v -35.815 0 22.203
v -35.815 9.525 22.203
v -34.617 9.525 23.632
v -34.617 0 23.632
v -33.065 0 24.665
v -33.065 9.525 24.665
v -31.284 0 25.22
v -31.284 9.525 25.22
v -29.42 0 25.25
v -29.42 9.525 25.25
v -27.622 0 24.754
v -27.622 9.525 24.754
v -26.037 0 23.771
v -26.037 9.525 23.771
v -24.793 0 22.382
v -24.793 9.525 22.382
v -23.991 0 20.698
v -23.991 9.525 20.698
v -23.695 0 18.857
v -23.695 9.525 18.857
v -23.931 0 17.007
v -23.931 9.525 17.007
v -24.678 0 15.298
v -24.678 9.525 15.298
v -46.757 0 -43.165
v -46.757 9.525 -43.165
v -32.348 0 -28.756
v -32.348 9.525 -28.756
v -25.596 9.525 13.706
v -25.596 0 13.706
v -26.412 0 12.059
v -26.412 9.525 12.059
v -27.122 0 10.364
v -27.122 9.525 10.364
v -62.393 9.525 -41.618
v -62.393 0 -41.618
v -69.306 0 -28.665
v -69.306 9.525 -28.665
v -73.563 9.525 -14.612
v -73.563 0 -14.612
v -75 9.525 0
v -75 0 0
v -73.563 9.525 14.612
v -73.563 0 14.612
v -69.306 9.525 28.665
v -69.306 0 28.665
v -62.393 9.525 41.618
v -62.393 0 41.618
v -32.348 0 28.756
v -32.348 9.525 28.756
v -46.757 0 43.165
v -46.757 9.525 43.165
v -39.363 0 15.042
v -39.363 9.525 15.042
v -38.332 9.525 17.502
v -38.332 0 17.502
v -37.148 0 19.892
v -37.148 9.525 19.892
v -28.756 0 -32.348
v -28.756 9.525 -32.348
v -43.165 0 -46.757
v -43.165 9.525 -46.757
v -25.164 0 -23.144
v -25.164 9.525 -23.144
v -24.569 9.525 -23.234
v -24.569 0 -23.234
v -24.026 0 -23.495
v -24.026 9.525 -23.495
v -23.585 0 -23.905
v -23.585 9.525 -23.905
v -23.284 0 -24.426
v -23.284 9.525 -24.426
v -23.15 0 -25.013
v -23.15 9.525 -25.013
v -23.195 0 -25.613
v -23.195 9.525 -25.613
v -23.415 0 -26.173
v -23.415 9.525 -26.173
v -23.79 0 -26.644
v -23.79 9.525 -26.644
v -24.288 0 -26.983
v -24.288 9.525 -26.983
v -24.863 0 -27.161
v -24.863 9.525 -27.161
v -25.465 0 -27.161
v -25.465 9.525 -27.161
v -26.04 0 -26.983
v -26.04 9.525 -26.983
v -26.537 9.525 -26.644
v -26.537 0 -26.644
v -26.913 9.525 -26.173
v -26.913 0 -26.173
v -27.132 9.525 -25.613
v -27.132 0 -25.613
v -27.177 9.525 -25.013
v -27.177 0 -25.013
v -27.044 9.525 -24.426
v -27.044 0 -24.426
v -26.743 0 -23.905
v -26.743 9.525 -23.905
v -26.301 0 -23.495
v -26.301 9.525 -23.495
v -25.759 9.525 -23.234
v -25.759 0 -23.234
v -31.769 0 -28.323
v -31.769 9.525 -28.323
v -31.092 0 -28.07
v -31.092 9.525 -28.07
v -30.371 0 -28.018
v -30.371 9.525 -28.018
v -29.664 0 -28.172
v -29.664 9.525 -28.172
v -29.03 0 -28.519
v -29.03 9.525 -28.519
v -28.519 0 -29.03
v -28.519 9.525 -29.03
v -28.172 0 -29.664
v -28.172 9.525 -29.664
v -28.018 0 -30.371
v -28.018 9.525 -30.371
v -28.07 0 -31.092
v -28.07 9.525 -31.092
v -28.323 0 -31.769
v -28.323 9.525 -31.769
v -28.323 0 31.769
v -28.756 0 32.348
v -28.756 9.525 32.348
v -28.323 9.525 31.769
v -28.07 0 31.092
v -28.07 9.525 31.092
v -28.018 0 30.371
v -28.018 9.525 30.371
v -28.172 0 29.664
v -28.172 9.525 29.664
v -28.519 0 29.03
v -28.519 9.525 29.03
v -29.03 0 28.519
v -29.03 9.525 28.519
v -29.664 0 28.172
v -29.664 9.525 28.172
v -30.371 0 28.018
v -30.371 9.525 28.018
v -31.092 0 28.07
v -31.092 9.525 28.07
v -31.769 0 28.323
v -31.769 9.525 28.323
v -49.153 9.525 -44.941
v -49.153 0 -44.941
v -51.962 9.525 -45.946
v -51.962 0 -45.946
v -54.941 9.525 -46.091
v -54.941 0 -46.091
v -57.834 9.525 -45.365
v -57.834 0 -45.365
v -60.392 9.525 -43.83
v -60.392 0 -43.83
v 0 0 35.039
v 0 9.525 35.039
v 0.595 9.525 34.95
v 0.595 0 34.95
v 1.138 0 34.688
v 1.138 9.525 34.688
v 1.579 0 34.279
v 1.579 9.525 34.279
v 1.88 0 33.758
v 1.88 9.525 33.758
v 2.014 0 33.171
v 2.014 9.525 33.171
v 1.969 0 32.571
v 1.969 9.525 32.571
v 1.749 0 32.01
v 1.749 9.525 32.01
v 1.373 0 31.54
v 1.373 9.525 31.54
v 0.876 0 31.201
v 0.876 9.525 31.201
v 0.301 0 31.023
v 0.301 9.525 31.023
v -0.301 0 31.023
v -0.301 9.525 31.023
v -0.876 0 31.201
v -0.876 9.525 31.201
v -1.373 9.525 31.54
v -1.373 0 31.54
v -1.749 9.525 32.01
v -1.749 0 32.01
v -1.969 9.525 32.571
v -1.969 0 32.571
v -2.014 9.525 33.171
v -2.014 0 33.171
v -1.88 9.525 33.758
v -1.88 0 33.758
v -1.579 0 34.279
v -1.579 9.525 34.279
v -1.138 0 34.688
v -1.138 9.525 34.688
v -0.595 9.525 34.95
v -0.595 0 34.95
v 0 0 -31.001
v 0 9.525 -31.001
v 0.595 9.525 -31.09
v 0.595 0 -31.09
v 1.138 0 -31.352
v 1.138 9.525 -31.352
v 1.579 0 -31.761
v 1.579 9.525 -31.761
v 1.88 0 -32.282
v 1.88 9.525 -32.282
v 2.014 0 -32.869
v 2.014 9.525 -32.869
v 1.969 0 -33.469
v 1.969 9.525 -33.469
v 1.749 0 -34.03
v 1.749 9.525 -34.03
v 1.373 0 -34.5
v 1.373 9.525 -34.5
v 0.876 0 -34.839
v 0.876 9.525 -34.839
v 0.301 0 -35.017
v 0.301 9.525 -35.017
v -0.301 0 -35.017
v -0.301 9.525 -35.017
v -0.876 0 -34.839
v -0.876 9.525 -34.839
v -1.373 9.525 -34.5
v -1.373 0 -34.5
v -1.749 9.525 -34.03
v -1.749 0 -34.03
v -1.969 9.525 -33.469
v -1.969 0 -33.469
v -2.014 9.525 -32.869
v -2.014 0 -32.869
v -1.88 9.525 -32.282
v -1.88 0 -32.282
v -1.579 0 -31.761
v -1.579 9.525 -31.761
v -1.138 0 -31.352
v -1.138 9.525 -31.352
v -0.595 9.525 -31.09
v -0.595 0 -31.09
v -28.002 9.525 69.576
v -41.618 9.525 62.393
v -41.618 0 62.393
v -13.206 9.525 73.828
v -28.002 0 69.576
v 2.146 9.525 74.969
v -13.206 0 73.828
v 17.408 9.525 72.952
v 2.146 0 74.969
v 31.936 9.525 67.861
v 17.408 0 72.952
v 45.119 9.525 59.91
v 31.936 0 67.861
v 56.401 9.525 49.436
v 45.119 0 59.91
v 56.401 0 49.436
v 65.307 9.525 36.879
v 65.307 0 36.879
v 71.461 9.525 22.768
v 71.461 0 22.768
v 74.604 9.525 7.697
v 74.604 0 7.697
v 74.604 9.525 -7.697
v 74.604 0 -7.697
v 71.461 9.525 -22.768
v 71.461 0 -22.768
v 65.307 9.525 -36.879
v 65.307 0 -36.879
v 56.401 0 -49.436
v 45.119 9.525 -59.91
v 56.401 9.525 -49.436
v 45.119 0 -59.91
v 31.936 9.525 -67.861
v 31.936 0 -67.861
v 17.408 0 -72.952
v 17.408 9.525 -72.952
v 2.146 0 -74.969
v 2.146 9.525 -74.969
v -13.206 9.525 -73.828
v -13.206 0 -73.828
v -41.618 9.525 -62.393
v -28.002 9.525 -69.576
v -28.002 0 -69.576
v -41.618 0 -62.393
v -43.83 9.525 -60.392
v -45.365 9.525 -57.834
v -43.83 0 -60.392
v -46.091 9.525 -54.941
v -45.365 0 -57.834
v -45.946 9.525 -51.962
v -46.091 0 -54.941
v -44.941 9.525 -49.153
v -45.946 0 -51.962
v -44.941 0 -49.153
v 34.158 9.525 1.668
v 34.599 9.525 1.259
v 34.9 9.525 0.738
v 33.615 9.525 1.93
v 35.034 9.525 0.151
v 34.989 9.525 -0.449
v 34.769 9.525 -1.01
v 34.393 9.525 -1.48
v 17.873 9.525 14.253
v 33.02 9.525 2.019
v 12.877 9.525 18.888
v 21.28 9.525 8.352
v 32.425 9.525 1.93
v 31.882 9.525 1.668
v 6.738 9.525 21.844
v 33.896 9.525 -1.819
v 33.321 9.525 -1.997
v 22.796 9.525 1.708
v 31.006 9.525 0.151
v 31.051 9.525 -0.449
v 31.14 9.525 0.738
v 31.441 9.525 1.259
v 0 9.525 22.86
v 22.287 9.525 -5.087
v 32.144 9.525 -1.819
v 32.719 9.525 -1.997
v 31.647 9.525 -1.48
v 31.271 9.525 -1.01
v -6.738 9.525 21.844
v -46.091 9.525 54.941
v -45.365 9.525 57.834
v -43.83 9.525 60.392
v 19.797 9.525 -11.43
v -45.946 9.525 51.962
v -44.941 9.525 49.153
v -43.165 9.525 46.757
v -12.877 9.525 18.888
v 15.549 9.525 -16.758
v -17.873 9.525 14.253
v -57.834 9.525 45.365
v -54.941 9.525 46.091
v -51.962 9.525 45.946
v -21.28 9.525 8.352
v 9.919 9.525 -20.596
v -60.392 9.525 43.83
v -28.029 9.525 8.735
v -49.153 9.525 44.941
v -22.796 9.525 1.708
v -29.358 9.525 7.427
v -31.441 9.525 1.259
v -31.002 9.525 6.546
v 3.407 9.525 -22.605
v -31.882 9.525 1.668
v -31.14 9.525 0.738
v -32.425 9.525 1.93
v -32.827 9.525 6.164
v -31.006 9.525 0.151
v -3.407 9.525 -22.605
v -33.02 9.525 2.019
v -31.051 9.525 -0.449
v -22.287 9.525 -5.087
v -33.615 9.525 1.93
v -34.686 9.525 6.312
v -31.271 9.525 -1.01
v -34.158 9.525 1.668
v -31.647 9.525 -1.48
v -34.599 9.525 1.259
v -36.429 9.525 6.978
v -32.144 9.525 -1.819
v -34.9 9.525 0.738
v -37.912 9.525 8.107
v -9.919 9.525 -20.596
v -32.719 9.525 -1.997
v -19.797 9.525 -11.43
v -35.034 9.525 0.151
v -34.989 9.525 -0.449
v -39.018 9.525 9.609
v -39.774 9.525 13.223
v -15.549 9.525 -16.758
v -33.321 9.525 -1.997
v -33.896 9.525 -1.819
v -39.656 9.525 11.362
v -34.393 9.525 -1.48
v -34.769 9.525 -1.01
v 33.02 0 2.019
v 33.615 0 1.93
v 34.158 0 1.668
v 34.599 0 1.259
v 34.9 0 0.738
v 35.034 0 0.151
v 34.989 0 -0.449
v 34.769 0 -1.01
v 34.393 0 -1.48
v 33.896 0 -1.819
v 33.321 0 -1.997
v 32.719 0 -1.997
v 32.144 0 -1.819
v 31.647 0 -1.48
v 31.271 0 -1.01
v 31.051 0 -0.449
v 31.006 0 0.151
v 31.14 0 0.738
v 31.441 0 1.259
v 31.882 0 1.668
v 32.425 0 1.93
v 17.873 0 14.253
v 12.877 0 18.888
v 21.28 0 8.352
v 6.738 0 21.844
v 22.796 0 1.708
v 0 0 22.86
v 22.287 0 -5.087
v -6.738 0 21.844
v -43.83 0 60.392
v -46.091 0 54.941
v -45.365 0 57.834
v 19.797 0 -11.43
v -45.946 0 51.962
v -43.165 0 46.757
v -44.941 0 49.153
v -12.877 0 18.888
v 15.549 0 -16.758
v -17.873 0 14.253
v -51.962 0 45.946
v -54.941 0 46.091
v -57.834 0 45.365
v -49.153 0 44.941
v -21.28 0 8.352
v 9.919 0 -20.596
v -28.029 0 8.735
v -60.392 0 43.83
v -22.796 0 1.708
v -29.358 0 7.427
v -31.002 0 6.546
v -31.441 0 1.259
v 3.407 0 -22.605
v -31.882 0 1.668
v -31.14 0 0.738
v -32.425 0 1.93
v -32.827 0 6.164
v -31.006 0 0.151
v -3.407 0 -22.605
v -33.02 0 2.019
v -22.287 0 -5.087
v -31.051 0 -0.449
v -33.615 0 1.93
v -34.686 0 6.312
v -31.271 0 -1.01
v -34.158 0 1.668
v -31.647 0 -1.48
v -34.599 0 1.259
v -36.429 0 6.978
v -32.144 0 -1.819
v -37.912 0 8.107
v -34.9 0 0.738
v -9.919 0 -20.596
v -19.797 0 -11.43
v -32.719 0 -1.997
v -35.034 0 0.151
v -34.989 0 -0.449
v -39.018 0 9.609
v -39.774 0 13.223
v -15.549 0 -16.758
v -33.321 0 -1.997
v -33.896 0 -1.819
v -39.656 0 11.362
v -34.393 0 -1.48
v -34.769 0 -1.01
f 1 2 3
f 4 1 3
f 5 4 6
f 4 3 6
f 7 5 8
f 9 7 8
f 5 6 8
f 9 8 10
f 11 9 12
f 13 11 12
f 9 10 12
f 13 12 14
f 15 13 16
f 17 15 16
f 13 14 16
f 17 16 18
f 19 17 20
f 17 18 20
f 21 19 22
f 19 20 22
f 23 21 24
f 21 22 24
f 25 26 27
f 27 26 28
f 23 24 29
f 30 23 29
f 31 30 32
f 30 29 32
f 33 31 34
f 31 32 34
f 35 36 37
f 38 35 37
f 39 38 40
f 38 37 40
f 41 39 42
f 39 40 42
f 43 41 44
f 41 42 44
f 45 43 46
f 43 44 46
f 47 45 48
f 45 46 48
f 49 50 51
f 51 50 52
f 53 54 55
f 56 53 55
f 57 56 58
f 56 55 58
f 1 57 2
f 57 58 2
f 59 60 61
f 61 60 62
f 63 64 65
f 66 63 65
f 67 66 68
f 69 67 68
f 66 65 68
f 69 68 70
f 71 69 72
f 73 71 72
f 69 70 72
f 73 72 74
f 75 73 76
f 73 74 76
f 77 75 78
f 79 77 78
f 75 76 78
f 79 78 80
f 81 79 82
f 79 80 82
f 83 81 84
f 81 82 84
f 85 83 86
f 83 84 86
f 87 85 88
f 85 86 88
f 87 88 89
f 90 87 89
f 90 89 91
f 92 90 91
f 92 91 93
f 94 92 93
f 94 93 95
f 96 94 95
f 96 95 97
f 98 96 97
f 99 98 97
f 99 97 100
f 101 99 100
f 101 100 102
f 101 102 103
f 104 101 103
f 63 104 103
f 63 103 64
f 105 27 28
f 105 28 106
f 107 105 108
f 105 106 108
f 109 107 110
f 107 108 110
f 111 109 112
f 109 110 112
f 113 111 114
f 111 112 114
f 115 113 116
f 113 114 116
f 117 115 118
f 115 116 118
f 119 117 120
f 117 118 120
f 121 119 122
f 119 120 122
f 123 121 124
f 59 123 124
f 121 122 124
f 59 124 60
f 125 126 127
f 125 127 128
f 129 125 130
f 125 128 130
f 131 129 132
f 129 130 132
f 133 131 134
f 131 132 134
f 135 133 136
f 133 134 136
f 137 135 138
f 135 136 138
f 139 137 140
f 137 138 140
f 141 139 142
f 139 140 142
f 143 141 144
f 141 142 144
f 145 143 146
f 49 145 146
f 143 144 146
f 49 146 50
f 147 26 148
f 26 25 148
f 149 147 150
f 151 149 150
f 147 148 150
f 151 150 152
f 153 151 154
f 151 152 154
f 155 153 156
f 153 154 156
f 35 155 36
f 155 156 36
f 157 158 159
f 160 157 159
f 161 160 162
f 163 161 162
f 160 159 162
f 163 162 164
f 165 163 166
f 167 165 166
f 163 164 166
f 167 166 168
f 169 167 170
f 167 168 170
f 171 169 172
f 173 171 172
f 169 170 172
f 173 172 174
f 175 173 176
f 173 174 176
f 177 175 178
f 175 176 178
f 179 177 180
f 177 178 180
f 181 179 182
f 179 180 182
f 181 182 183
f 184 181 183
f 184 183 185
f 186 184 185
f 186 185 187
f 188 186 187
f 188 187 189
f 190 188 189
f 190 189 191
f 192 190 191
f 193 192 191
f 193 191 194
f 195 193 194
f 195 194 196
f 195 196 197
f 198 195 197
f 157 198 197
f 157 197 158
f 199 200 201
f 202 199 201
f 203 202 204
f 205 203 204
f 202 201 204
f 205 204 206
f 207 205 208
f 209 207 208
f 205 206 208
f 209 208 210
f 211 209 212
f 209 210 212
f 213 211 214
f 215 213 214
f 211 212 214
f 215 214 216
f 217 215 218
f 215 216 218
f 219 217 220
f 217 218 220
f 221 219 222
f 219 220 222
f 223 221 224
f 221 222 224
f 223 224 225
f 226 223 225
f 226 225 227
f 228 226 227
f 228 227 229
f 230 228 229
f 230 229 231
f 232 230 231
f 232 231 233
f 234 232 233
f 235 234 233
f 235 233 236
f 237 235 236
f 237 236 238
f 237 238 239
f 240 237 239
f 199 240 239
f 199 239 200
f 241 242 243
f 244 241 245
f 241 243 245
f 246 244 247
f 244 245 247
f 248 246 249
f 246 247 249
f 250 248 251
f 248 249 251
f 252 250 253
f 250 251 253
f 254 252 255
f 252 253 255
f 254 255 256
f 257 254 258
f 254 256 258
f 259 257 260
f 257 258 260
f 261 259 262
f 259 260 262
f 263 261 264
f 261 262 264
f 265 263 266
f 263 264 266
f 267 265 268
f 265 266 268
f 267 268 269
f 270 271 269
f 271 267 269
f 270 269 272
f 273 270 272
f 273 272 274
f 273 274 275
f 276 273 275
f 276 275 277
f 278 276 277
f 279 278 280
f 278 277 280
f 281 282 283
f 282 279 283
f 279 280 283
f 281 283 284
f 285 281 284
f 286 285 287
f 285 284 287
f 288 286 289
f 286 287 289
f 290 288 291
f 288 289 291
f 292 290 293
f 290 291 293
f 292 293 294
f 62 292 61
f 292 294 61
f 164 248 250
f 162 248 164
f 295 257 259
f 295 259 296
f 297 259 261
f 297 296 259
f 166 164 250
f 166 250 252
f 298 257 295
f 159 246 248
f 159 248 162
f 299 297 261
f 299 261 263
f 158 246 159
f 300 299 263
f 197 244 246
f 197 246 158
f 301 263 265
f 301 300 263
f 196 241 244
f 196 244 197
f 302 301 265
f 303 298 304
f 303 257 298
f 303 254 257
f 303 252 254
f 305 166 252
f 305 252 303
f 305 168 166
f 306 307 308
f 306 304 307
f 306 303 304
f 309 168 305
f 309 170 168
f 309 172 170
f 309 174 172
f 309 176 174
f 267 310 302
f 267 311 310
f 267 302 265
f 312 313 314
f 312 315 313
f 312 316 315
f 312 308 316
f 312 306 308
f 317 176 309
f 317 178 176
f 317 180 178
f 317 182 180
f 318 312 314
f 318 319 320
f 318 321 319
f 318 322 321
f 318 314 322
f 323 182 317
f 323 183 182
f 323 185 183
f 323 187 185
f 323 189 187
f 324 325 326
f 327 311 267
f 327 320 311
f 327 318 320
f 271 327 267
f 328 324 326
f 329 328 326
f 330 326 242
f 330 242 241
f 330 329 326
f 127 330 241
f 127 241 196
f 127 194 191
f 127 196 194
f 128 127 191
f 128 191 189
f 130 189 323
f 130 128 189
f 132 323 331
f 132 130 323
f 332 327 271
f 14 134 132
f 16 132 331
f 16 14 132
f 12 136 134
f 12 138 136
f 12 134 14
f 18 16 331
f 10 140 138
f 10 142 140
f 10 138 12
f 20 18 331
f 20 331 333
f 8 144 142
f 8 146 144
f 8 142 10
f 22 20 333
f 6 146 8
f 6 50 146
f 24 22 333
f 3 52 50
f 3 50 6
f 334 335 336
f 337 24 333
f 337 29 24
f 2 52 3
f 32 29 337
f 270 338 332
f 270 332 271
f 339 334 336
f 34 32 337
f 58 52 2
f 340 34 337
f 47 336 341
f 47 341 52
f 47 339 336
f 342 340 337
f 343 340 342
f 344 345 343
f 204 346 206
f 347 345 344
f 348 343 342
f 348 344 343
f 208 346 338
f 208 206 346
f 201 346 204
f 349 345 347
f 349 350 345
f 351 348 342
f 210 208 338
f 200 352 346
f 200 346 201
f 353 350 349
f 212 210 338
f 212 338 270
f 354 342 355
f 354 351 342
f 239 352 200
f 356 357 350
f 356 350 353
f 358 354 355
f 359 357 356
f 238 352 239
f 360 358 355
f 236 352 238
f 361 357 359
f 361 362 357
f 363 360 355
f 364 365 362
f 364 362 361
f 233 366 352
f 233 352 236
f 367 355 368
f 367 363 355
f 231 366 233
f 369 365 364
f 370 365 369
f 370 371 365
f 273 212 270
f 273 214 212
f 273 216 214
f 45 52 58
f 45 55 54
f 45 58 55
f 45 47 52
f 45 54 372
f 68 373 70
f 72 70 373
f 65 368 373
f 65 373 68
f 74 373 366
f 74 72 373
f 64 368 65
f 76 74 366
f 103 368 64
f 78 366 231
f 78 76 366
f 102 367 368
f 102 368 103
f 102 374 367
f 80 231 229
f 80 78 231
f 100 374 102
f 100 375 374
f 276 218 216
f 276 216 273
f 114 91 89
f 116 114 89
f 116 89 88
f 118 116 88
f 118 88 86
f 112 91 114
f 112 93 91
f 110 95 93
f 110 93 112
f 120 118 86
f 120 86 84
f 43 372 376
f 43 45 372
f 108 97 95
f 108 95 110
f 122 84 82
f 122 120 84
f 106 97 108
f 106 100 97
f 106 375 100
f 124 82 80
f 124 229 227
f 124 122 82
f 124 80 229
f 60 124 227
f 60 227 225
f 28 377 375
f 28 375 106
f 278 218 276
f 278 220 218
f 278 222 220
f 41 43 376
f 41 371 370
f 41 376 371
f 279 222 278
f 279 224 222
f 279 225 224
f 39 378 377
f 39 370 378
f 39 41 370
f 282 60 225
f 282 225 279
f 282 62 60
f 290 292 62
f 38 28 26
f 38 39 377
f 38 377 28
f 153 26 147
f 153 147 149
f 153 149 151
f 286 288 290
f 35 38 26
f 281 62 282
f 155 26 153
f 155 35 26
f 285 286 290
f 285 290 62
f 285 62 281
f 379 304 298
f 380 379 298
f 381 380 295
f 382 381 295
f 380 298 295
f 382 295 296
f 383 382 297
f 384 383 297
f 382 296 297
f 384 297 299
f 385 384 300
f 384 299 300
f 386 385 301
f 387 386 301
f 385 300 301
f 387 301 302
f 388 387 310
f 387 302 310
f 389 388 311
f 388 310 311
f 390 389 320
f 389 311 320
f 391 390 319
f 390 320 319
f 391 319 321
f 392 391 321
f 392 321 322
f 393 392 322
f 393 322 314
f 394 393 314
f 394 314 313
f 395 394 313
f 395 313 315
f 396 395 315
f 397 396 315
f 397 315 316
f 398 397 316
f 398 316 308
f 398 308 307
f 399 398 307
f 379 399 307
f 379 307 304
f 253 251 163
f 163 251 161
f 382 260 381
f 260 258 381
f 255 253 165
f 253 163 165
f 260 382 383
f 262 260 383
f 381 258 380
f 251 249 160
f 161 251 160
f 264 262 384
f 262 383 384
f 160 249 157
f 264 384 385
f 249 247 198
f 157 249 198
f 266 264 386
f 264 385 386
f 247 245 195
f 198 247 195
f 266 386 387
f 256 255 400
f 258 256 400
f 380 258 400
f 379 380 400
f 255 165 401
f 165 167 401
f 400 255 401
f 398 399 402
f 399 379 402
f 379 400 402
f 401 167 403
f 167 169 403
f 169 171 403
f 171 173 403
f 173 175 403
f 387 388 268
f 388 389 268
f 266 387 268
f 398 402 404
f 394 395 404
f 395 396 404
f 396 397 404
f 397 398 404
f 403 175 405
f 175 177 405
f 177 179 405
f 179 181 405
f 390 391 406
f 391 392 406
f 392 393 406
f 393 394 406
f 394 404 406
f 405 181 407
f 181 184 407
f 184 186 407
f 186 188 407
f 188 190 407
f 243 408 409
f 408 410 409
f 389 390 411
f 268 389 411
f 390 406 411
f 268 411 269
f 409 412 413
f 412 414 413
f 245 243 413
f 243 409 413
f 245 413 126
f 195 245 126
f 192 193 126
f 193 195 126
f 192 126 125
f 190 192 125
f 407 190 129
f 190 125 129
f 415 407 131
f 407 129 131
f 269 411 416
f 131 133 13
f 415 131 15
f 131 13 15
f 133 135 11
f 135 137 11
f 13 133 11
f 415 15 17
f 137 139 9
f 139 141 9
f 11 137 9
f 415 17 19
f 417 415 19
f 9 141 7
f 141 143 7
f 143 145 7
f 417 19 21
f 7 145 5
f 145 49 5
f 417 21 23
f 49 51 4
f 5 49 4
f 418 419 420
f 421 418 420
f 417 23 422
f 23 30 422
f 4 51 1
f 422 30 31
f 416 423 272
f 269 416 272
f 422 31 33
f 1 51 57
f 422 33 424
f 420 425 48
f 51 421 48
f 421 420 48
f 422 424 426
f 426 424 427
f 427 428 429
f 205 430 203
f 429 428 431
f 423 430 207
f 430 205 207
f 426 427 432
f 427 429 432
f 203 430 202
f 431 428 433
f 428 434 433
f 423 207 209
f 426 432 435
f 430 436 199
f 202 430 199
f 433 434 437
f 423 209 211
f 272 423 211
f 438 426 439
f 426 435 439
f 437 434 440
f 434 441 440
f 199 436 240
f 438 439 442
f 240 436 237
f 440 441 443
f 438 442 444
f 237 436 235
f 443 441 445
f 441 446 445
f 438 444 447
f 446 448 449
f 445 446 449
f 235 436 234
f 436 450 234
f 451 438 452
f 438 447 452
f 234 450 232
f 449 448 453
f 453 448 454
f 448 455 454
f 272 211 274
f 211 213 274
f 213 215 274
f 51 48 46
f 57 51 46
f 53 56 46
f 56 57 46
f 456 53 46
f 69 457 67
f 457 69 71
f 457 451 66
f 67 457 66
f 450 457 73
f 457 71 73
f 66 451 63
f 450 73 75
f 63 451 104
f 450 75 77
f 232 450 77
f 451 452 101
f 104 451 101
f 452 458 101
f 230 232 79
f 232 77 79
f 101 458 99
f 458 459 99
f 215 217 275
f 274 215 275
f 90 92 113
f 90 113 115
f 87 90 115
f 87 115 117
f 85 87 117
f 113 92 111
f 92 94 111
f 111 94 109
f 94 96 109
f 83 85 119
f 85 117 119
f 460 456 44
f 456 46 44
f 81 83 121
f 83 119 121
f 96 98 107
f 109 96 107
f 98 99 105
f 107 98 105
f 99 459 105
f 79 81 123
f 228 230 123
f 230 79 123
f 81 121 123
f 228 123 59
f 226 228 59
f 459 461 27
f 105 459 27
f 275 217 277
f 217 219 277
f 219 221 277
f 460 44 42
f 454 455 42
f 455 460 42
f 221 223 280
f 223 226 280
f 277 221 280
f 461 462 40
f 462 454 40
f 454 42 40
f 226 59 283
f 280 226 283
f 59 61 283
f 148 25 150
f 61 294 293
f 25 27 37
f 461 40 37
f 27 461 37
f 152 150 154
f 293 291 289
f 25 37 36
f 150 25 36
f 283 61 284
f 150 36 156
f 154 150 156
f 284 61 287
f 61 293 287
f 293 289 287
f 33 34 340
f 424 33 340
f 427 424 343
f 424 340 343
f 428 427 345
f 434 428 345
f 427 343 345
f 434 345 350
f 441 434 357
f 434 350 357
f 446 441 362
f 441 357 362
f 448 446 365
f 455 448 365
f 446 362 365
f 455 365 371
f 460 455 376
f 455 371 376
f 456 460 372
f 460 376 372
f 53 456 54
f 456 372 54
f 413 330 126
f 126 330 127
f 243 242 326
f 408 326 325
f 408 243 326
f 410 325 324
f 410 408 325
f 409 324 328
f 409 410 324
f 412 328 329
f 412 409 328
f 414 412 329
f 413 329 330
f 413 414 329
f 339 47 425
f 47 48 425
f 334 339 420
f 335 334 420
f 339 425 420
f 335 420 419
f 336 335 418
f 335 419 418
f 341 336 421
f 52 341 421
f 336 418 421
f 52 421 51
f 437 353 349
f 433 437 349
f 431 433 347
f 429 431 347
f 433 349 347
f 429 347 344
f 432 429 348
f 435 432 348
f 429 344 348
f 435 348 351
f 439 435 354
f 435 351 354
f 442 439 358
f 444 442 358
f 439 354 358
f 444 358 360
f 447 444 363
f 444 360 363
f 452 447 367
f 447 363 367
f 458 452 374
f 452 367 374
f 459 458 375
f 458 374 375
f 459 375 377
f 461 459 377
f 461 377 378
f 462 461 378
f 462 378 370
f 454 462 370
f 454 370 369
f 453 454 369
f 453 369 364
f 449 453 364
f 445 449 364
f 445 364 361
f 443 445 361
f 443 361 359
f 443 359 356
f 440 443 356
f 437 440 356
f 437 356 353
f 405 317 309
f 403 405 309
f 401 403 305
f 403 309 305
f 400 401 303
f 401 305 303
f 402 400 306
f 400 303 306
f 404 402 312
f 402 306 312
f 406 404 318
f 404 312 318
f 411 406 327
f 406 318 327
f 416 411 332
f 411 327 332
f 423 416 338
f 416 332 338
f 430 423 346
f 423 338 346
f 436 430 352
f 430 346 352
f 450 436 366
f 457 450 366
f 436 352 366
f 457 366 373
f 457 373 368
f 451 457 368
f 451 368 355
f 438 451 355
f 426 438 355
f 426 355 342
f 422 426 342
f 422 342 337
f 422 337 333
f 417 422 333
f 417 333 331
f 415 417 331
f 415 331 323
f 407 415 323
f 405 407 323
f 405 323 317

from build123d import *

# Parameters (mm, degrees)
SKETCH1_R           = 75
BOSS_EXTRUDE1_DEPTH = 9.525
CUT_EXTRUDE2_REACH  = 108.493
FILLET1_R           = 10.16
SKETCH39_R          = 22.86
SKETCH39_R_2        = 2.0193
CUT_EXTRUDE30_DEPTH = 247.31360274
SKETCH42_R          = 2.0193
CUT_EXTRUDE33_DEPTH = 247.31360274
CUT_EXTRUDE35_DEPTH = 247.31360274


with BuildPart() as part:
    # Sketch1 → Boss-Extrude1 (new body)
    with BuildSketch(Plane(origin=(0, 0, 0), x_dir=(1, 0, 0), z_dir=(0, 1, 0))):
        with Locations(Location((0, 0, 0), (0, 0, 90))):
            Circle(SKETCH1_R)
    extrude(amount=BOSS_EXTRUDE1_DEPTH)

    # Sketch11 → Cut-Extrude2 (cut, up to next)
    with BuildSketch(Plane(origin=(0, 9.525, 0), x_dir=(1, 0, 0), z_dir=(0, 1, 0)), mode=Mode.PRIVATE) as cut_extrude2_sk1:
        with BuildLine():
            Line((-54.798637954, 51.206535505), (-32.347997651, 28.755895202))
            ThreePointArc((-32.347997651, 28.755895202), (-28.755895202, 28.755895202), (-28.755895202, 32.347997651))
            Line((-28.755895202, 32.347997651), (-51.206535505, 54.798637954))
            ThreePointArc((-51.206535505, 54.798637954), (-53.033008589, 53.033008589), (-54.798637954, 51.206535505))
        make_face()
    cut_extrude2_tool1 = extrude(cut_extrude2_sk1.sketch, amount=-CUT_EXTRUDE2_REACH, mode=Mode.PRIVATE) & part.part
    # Sketch11 → Cut-Extrude2 (cut, up to next)
    with BuildSketch(Plane(origin=(0, 9.525, 0), x_dir=(1, 0, 0), z_dir=(0, 1, 0)), mode=Mode.PRIVATE) as cut_extrude2_sk2:
        with BuildLine():
            Line((-51.206535505, -54.798637954), (-28.755895202, -32.347997651))
            ThreePointArc((-28.755895202, -32.347997651), (-28.755895202, -28.755895202), (-32.347997651, -28.755895202))
            Line((-32.347997651, -28.755895202), (-54.798637954, -51.206535505))
            ThreePointArc((-54.798637954, -51.206535505), (-53.033008589, -53.033008589), (-51.206535505, -54.798637954))
        make_face()
    cut_extrude2_tool2 = extrude(cut_extrude2_sk2.sketch, amount=-CUT_EXTRUDE2_REACH, mode=Mode.PRIVATE) & part.part
    add(cut_extrude2_tool1.solids().sort_by_distance((-41.078737, 9.525, -41.078737))[0], mode=Mode.SUBTRACT)
    add(cut_extrude2_tool2.solids().sort_by_distance((-41.078737, 9.525, 41.078737))[0], mode=Mode.SUBTRACT)

    # Fillet1
    fillet1_edges = [part.edges().sort_by_distance(p)[0] for p in [
        (-51.206535505, 4.7625, 54.798637954),
        (-54.798637954, 4.7625, 51.206535505),
        (-54.798637954, 4.7625, -51.206535505),
        (-51.206535505, 4.7625, -54.798637954),
    ]]
    fillet(fillet1_edges, radius=FILLET1_R)

    # Sketch39 → Cut-Extrude30 (cut, through all)
    with BuildSketch(Plane(origin=(-73.768816189, 9.525, -121.080352405), x_dir=(1, 0, 0), z_dir=(0, 1, 0))):
        with Locations(Location((73.768816189, -121.080352405, 0), (0, 0, 270))):
            Circle(SKETCH39_R)
        with Locations(Location((73.768816189, -88.060352405, 0), (0, 0, 270))):
            Circle(SKETCH39_R_2)
        with Locations(Location((106.788816189, -121.080352405, 0), (0, 0, 270))):
            Circle(SKETCH39_R_2)
        with Locations(Location((73.768816189, -154.100352405, 0), (0, 0, 270))):
            Circle(SKETCH39_R_2)
        with Locations(Location((40.748816189, -121.080352405, 0), (0, 0, 270))):
            Circle(SKETCH39_R_2)
    extrude(amount=-CUT_EXTRUDE30_DEPTH, mode=Mode.SUBTRACT)

    # Sketch42 → Cut-Extrude33 (cut, through all)
    with BuildSketch(Plane(origin=(-73.768816189, 9.525, -121.080352405), x_dir=(1, 0, 0), z_dir=(0, 1, 0))):
        with Locations(Location((48.605023435, -95.916559651, 0), (0, 0, 270))):
            Circle(SKETCH42_R)
    extrude(amount=-CUT_EXTRUDE33_DEPTH, mode=Mode.SUBTRACT)

    # Sketch44 → Cut-Extrude35 (cut, through all)
    with BuildSketch(Plane(origin=(-73.768816189, 9.525, -121.080352405), x_dir=(1, 0, 0), z_dir=(0, 1, 0))):
        with BuildLine():
            ThreePointArc((34.405967979, -136.122213123), (36.00963526, -139.786919397), (37.953573181, -143.283049568))
            ThreePointArc((37.953573181, -143.283049568), (46.974494303, -145.399596657), (49.091041391, -136.378675534))
            ThreePointArc((49.091041391, -136.378675534), (47.751609959, -133.969737166), (46.646635186, -131.444644817))
            ThreePointArc((46.646635186, -131.444644817), (38.18751743, -127.663095366), (34.405967979, -136.122213123))
        make_face()
    extrude(amount=-CUT_EXTRUDE35_DEPTH, mode=Mode.SUBTRACT)


solid = part.part
